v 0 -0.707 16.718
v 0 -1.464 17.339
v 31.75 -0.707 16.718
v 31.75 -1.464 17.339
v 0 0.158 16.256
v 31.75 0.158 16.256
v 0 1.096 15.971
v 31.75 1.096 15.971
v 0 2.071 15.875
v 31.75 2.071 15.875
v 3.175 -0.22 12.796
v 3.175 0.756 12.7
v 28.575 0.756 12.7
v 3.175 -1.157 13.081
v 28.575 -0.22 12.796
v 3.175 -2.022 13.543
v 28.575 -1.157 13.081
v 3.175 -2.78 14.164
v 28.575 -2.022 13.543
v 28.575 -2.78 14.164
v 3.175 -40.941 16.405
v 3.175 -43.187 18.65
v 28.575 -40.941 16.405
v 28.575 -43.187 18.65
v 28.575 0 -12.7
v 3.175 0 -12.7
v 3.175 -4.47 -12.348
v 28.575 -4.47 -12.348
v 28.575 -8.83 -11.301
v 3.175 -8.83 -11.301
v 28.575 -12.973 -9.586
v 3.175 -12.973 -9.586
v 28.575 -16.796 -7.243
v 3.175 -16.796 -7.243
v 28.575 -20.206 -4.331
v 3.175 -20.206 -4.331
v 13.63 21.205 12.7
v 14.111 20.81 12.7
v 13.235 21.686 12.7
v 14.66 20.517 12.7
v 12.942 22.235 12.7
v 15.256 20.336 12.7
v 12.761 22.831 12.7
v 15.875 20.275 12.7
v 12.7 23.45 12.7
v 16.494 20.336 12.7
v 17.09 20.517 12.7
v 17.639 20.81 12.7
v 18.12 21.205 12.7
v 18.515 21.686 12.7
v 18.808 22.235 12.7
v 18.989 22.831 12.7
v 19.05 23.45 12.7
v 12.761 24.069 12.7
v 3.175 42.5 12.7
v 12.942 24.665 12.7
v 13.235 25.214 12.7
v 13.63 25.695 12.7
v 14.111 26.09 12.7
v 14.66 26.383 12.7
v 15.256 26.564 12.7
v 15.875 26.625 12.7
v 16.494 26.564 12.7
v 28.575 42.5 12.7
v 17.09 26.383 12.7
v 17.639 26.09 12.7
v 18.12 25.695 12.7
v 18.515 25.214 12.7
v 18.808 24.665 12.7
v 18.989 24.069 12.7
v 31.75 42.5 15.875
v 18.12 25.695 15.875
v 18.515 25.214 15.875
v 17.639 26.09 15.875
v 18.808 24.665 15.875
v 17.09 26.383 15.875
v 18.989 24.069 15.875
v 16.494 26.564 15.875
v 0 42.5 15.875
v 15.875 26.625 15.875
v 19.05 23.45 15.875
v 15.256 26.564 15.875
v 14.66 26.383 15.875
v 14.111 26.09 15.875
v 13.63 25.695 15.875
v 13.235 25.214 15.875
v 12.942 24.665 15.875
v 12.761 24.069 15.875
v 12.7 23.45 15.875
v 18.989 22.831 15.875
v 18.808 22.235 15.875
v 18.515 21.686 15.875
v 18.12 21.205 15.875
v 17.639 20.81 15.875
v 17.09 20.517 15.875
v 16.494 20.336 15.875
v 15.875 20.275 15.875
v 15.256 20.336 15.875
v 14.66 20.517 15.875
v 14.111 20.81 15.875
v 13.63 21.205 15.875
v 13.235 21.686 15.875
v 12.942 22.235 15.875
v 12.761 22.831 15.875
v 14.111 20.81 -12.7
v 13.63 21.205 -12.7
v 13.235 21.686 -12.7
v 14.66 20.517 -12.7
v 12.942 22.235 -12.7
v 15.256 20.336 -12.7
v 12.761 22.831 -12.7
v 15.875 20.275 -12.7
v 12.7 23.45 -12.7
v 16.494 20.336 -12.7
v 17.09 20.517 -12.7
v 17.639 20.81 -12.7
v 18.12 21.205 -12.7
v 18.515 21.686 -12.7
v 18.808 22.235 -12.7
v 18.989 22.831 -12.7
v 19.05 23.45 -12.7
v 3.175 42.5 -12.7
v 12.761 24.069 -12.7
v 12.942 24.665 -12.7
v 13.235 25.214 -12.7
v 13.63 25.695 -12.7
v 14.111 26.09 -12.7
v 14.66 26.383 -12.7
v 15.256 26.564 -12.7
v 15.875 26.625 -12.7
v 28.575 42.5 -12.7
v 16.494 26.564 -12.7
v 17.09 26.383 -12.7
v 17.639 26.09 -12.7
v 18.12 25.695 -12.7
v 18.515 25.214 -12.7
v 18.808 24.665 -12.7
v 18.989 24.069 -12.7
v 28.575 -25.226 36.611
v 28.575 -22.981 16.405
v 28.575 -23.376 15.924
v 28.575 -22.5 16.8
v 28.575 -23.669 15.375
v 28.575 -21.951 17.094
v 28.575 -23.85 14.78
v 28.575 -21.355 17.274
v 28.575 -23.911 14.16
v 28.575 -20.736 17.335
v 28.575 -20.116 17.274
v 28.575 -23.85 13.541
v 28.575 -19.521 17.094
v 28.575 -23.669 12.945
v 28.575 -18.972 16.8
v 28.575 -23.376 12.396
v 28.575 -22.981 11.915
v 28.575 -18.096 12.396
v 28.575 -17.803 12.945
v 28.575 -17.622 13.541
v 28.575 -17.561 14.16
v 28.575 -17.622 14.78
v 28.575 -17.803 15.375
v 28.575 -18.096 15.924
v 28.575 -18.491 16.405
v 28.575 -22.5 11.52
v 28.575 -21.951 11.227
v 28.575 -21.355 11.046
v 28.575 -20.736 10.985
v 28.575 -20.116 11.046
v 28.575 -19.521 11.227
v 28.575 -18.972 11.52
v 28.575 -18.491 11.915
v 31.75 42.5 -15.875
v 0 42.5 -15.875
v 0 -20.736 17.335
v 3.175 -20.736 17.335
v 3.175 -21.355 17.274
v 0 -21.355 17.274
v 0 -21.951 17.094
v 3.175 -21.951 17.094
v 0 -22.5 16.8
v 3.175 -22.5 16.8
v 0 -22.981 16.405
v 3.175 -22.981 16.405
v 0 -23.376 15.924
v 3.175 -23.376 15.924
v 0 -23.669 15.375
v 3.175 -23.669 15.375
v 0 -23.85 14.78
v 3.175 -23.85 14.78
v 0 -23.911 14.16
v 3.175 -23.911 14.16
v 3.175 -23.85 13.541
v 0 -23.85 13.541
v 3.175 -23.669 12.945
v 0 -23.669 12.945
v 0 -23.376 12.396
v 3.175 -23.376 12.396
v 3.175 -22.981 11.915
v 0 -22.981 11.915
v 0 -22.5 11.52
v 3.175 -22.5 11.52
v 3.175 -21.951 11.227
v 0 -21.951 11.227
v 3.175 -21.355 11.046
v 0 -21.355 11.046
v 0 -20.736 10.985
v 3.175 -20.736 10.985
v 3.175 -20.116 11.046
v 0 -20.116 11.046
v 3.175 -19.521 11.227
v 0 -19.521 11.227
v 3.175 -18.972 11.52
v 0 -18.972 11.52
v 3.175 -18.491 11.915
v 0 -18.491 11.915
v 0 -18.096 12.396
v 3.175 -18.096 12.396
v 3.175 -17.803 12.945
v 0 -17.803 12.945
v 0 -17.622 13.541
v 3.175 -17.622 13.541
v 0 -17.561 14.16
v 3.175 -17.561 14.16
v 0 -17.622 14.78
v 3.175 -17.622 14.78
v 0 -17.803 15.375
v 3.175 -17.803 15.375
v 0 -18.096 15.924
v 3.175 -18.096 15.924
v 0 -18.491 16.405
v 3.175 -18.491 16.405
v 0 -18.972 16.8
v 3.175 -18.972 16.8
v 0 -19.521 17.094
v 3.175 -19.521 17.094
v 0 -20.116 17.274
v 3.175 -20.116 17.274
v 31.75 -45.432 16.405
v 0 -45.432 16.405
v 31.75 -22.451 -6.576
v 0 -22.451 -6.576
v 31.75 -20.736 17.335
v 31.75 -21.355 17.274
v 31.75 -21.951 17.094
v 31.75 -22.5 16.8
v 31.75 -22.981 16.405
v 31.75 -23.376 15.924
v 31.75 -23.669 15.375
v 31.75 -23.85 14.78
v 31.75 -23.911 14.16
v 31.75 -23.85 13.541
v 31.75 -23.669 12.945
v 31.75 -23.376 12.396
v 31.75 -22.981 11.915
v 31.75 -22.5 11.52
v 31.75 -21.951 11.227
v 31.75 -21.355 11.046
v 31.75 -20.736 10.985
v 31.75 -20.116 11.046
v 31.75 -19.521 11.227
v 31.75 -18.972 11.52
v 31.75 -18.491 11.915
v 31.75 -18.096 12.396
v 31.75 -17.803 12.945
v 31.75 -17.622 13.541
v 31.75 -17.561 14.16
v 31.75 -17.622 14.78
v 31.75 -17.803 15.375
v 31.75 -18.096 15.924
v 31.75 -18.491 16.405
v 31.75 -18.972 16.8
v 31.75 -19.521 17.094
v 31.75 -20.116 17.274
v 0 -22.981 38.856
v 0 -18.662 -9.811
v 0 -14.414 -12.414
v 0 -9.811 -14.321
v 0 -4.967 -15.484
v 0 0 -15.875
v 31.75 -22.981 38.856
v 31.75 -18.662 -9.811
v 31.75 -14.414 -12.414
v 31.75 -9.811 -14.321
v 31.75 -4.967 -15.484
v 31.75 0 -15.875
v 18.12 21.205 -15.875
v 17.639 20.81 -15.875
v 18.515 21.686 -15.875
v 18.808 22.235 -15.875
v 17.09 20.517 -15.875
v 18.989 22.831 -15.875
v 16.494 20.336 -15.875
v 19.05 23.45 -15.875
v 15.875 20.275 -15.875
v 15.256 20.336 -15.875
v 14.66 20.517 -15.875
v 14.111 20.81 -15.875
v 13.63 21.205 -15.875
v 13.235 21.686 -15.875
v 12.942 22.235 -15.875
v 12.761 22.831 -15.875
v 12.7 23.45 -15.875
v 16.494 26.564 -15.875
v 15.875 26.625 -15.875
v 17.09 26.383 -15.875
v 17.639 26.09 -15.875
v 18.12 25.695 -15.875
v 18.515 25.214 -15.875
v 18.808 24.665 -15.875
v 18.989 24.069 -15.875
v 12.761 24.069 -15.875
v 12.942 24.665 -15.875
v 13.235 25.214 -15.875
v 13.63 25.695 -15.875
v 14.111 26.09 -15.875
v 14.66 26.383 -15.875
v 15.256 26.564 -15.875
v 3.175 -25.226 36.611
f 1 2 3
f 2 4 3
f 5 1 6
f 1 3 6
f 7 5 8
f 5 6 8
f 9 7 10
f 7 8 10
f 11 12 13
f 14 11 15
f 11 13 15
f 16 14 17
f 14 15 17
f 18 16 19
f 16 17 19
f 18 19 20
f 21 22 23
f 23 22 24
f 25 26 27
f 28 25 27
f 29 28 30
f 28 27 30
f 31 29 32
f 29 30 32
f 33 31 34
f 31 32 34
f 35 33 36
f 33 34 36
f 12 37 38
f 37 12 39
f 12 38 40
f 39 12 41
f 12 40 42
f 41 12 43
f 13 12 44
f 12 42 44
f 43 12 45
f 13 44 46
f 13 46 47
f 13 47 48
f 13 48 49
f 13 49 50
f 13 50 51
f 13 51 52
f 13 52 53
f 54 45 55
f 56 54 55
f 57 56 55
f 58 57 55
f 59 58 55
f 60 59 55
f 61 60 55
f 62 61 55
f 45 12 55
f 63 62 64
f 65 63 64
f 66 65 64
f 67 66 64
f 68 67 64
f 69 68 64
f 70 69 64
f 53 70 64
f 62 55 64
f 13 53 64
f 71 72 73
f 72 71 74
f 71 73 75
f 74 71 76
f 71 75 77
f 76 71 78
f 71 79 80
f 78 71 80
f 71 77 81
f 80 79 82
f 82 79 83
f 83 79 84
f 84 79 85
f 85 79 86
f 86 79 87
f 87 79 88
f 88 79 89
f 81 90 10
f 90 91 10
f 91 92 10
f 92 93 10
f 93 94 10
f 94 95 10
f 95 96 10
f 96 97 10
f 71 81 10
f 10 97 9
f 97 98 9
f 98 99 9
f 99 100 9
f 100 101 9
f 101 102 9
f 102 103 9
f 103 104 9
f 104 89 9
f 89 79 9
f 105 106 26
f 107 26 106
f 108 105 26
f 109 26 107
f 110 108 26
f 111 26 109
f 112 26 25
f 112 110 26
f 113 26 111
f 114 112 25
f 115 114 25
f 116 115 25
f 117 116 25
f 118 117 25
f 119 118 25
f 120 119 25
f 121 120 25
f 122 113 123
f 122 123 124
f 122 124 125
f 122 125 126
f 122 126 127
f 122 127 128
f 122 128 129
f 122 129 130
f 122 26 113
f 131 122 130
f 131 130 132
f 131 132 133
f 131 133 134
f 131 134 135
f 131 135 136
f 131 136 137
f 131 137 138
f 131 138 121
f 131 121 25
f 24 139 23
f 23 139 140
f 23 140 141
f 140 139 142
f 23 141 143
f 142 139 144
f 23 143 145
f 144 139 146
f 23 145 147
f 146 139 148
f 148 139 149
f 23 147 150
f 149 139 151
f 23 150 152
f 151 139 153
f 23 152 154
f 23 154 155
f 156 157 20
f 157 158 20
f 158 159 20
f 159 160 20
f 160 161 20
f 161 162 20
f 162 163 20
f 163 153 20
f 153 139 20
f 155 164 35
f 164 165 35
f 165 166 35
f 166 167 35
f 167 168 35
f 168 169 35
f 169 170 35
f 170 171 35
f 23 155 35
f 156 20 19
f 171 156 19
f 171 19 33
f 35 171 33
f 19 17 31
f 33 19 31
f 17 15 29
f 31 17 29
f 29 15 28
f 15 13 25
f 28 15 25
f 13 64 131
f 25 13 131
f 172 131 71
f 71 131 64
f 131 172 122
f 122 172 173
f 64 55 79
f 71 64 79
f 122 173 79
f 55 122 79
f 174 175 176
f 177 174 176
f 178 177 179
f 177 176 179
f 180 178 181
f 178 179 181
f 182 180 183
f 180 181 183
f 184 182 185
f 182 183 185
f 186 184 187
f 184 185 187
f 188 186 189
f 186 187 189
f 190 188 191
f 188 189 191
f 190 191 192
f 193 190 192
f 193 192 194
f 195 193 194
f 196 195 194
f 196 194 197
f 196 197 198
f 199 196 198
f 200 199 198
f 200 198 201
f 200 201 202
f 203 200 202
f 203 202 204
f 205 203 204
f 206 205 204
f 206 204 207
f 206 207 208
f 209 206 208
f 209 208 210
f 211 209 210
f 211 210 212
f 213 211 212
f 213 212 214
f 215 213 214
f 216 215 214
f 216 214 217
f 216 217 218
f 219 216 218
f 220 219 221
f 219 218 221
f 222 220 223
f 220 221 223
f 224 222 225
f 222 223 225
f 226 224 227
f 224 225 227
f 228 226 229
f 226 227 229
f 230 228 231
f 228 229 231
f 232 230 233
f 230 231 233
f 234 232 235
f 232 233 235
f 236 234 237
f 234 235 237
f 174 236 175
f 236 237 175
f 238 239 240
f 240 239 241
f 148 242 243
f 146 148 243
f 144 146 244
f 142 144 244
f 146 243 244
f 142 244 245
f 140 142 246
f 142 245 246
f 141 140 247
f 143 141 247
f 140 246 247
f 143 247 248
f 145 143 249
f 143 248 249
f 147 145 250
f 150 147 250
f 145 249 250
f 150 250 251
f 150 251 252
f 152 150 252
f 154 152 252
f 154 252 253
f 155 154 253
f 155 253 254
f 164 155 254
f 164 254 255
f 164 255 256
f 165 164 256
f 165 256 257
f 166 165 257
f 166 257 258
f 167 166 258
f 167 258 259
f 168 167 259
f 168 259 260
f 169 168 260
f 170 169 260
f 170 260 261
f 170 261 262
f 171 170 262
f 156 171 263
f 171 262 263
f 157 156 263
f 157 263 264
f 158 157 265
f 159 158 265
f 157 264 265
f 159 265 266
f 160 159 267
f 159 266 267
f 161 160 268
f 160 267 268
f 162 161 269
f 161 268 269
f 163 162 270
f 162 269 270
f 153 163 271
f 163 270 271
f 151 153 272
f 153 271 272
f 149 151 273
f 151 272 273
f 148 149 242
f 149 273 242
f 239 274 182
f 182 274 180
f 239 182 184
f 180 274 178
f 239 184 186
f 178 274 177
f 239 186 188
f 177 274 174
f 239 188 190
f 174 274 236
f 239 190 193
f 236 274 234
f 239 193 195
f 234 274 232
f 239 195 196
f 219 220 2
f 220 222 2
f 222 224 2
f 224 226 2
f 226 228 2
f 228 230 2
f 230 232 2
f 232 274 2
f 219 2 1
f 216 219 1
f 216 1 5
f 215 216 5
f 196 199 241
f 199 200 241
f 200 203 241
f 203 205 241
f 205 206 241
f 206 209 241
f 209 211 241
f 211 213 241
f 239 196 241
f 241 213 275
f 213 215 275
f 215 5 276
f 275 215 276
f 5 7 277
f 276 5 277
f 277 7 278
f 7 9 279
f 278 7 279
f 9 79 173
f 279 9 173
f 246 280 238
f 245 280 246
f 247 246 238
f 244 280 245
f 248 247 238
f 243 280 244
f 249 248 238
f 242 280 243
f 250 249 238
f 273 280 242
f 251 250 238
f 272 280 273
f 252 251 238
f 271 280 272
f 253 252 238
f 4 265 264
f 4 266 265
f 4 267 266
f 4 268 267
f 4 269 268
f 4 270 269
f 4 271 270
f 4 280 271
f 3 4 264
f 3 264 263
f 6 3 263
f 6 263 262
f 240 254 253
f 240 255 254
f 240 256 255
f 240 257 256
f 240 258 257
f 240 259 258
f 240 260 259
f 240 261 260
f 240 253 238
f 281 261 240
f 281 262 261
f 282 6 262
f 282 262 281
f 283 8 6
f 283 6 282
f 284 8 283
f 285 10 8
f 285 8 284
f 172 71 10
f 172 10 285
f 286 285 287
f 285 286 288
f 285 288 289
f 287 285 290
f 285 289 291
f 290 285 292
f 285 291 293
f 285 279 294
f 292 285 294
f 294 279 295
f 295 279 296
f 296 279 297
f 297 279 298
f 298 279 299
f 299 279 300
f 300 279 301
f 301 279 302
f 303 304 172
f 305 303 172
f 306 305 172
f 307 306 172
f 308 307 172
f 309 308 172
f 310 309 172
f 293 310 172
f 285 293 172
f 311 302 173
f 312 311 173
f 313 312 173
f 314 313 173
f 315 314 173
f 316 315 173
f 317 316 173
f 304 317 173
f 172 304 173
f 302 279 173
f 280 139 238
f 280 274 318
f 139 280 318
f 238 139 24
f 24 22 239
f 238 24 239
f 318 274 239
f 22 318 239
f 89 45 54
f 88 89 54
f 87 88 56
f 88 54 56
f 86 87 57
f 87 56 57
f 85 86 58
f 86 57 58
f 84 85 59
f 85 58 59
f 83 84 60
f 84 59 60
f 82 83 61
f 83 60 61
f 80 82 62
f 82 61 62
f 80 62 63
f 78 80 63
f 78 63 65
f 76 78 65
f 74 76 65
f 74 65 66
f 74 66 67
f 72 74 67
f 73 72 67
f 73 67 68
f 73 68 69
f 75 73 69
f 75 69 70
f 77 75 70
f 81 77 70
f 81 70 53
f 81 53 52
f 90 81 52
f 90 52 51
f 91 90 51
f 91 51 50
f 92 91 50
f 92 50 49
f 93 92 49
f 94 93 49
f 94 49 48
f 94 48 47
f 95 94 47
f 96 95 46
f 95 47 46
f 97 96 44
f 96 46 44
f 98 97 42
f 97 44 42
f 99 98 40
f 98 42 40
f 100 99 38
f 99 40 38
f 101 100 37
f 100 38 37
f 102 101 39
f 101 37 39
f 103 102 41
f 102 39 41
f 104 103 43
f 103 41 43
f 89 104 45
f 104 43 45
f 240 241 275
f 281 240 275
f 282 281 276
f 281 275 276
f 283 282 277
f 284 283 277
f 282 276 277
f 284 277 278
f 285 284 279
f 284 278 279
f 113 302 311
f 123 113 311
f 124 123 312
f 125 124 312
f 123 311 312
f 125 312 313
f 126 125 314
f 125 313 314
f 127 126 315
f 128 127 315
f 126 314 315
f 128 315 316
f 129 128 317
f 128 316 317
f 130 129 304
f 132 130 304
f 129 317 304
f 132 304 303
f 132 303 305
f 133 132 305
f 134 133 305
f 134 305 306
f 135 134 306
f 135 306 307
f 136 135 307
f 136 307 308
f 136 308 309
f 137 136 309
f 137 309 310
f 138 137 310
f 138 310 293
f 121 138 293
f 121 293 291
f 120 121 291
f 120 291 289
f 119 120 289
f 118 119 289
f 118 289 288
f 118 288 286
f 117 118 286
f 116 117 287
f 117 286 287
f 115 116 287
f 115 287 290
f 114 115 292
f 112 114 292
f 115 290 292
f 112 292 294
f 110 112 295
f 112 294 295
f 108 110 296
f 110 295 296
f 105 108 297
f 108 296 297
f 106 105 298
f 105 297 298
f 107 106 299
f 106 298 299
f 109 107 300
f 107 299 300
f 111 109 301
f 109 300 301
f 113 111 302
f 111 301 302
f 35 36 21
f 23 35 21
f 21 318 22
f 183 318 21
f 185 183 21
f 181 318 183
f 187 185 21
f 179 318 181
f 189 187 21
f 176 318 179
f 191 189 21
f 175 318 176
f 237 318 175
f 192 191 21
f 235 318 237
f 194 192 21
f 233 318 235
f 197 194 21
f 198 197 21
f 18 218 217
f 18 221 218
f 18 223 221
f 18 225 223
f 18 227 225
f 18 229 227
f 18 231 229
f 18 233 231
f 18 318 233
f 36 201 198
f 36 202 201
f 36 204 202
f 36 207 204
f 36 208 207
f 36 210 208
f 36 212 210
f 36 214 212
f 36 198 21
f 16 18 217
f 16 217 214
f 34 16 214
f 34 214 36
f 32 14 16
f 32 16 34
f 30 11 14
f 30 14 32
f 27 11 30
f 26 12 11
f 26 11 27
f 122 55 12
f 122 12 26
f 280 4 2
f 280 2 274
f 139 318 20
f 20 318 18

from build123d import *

# Parameters (mm, degrees)
BOSS_EXTRUDE1_DEPTH = 31.75
CUT_EXTRUDE2_START  = -3.175
CUT_EXTRUDE2_DEPTH  = 25.4
SKETCH4_W           = 25.4
SKETCH4_H           = 25.4
CUT_EXTRUDE3_DEPTH  = 3.175
SKETCH6_W           = 25.4
SKETCH6_H           = 25.4
CUT_EXTRUDE5_DEPTH  = 3.175
FILLET1_R           = 5
CUT_EXTRUDE6_REACH  = 79.895
SKETCH8_R           = 3.175
CUT_EXTRUDE7_REACH  = 69.69
SKETCH9_R           = 3.175


with BuildPart() as part:
    # Sketch1 → Boss-Extrude1 (new body)
    with BuildSketch(Plane(origin=(0, 0, 0), x_dir=(0, 0, -1), z_dir=(1, 0, 0))):
        with BuildLine():
            Line((15.875, 42.5), (-15.875, 42.5))
            Line((-15.875, 42.5), (-15.875, 0))
            Line((-15.875, 0), (-38.855970389, -22.980970389))
            Line((-38.855970389, -22.980970389), (-16.405330086, -45.431610691))
            Line((-16.405330086, -45.431610691), (6.575640303, -22.450640303))
            ThreePointArc((6.575640303, -22.450640303), (13.458175157, -12.150198978), (15.875, 0))
            Line((15.875, 0), (15.875, 42.5))
        make_face()
    extrude(amount=BOSS_EXTRUDE1_DEPTH)

    # Sketch3 → Cut-Extrude2 (cut)
    with BuildSketch(Plane.ZY.offset(CUT_EXTRUDE2_START)):
        with BuildLine():
            Line((16.405330086, -40.941482631), (34.365842328, -22.980970389))
            Line((34.365842328, -22.980970389), (12.7, -1.315128061))
            Line((12.7, -1.315128061), (12.7, 39.325))
            Line((12.7, 39.325), (-12.7, 39.325))
            Line((-12.7, 39.325), (-12.7, 0))
            ThreePointArc((-12.7, 0), (-10.524857642, -10.93517908), (-4.330576272, -20.205576272))
            Line((-4.330576272, -20.205576272), (16.405330086, -40.941482631))
        make_face()
    extrude(amount=-CUT_EXTRUDE2_DEPTH, mode=Mode.SUBTRACT)

    # Sketch4 → Cut-Extrude3 (cut)
    with BuildSketch(Plane(origin=(0, 42.5, 0), x_dir=(1, 0, 0), z_dir=(0, 1, 0))):
        with Locations((15.875, 0)):
            Rectangle(SKETCH4_W, SKETCH4_H)
    extrude(amount=-CUT_EXTRUDE3_DEPTH, mode=Mode.SUBTRACT)

    # Sketch6 → Cut-Extrude5 (cut)
    with BuildSketch(Plane(origin=(0, -30.918470389, 30.918470389), x_dir=(1, 0, 0), z_dir=(0, -0.7071067811865518, 0.7071067811865434))):
        with Locations((15.875, -4.649679849)):
            Rectangle(SKETCH6_W, SKETCH6_H)
    extrude(amount=-CUT_EXTRUDE5_DEPTH, mode=Mode.SUBTRACT)

    # Fillet1
    fillet1_edges = [part.edges().sort_by_distance(p)[0] for p in [
        (15.875, 0, 15.875),
        (15.875, -1.315128061, 12.7),
    ]]
    fillet(fillet1_edges, radius=FILLET1_R)

    # Cut-Extrude6: up to this face of the body (flat: up to its plane)
    cut_extrude6_end = Plane(part.part.faces().sort_by_distance((15.875, 22.285533906, 15.875))[0])
    # Sketch8 → Cut-Extrude6 (cut, up to the picked face)
    with BuildSketch(Plane(origin=(0, 0, -15.875), x_dir=(-1, 0, 0), z_dir=(0, 0, -1)), mode=Mode.PRIVATE) as cut_extrude6_sk1:
        with Locations((-15.875, 23.45)):
            Circle(SKETCH8_R)
    cut_extrude6_tool1 = split(extrude(cut_extrude6_sk1.sketch, amount=-CUT_EXTRUDE6_REACH, mode=Mode.PRIVATE), bisect_by=cut_extrude6_end, keep=Keep.BOTH, mode=Mode.PRIVATE)
    add(cut_extrude6_tool1.solids().sort_by(Axis((15.875, 23.45, -15.875), (0, 0, 1)))[0], mode=Mode.SUBTRACT)

    # Cut-Extrude7: up to this face of the body (flat: up to its plane)
    cut_extrude7_end = Plane(part.part.faces().sort_by_distance((0, 0.759502888, 5.54562078))[0])
    # Sketch9 → Cut-Extrude7 (cut, up to the picked face)
    with BuildSketch(Plane(origin=(31.75, 0, 0), x_dir=(0, 0, -1), z_dir=(1, 0, 0)), mode=Mode.PRIVATE) as cut_extrude7_sk1:
        with Locations(Location((-14.160266056, -20.735906358, 0), (0, 0, 180))):
            Circle(SKETCH9_R)
    cut_extrude7_tool1 = split(extrude(cut_extrude7_sk1.sketch, amount=-CUT_EXTRUDE7_REACH, mode=Mode.PRIVATE), bisect_by=cut_extrude7_end, keep=Keep.BOTH, mode=Mode.PRIVATE)
    add(cut_extrude7_tool1.solids().sort_by(Axis((31.75, -20.735906, 14.160266), (-1, 0, 0)))[0], mode=Mode.SUBTRACT)


solid = part.part
